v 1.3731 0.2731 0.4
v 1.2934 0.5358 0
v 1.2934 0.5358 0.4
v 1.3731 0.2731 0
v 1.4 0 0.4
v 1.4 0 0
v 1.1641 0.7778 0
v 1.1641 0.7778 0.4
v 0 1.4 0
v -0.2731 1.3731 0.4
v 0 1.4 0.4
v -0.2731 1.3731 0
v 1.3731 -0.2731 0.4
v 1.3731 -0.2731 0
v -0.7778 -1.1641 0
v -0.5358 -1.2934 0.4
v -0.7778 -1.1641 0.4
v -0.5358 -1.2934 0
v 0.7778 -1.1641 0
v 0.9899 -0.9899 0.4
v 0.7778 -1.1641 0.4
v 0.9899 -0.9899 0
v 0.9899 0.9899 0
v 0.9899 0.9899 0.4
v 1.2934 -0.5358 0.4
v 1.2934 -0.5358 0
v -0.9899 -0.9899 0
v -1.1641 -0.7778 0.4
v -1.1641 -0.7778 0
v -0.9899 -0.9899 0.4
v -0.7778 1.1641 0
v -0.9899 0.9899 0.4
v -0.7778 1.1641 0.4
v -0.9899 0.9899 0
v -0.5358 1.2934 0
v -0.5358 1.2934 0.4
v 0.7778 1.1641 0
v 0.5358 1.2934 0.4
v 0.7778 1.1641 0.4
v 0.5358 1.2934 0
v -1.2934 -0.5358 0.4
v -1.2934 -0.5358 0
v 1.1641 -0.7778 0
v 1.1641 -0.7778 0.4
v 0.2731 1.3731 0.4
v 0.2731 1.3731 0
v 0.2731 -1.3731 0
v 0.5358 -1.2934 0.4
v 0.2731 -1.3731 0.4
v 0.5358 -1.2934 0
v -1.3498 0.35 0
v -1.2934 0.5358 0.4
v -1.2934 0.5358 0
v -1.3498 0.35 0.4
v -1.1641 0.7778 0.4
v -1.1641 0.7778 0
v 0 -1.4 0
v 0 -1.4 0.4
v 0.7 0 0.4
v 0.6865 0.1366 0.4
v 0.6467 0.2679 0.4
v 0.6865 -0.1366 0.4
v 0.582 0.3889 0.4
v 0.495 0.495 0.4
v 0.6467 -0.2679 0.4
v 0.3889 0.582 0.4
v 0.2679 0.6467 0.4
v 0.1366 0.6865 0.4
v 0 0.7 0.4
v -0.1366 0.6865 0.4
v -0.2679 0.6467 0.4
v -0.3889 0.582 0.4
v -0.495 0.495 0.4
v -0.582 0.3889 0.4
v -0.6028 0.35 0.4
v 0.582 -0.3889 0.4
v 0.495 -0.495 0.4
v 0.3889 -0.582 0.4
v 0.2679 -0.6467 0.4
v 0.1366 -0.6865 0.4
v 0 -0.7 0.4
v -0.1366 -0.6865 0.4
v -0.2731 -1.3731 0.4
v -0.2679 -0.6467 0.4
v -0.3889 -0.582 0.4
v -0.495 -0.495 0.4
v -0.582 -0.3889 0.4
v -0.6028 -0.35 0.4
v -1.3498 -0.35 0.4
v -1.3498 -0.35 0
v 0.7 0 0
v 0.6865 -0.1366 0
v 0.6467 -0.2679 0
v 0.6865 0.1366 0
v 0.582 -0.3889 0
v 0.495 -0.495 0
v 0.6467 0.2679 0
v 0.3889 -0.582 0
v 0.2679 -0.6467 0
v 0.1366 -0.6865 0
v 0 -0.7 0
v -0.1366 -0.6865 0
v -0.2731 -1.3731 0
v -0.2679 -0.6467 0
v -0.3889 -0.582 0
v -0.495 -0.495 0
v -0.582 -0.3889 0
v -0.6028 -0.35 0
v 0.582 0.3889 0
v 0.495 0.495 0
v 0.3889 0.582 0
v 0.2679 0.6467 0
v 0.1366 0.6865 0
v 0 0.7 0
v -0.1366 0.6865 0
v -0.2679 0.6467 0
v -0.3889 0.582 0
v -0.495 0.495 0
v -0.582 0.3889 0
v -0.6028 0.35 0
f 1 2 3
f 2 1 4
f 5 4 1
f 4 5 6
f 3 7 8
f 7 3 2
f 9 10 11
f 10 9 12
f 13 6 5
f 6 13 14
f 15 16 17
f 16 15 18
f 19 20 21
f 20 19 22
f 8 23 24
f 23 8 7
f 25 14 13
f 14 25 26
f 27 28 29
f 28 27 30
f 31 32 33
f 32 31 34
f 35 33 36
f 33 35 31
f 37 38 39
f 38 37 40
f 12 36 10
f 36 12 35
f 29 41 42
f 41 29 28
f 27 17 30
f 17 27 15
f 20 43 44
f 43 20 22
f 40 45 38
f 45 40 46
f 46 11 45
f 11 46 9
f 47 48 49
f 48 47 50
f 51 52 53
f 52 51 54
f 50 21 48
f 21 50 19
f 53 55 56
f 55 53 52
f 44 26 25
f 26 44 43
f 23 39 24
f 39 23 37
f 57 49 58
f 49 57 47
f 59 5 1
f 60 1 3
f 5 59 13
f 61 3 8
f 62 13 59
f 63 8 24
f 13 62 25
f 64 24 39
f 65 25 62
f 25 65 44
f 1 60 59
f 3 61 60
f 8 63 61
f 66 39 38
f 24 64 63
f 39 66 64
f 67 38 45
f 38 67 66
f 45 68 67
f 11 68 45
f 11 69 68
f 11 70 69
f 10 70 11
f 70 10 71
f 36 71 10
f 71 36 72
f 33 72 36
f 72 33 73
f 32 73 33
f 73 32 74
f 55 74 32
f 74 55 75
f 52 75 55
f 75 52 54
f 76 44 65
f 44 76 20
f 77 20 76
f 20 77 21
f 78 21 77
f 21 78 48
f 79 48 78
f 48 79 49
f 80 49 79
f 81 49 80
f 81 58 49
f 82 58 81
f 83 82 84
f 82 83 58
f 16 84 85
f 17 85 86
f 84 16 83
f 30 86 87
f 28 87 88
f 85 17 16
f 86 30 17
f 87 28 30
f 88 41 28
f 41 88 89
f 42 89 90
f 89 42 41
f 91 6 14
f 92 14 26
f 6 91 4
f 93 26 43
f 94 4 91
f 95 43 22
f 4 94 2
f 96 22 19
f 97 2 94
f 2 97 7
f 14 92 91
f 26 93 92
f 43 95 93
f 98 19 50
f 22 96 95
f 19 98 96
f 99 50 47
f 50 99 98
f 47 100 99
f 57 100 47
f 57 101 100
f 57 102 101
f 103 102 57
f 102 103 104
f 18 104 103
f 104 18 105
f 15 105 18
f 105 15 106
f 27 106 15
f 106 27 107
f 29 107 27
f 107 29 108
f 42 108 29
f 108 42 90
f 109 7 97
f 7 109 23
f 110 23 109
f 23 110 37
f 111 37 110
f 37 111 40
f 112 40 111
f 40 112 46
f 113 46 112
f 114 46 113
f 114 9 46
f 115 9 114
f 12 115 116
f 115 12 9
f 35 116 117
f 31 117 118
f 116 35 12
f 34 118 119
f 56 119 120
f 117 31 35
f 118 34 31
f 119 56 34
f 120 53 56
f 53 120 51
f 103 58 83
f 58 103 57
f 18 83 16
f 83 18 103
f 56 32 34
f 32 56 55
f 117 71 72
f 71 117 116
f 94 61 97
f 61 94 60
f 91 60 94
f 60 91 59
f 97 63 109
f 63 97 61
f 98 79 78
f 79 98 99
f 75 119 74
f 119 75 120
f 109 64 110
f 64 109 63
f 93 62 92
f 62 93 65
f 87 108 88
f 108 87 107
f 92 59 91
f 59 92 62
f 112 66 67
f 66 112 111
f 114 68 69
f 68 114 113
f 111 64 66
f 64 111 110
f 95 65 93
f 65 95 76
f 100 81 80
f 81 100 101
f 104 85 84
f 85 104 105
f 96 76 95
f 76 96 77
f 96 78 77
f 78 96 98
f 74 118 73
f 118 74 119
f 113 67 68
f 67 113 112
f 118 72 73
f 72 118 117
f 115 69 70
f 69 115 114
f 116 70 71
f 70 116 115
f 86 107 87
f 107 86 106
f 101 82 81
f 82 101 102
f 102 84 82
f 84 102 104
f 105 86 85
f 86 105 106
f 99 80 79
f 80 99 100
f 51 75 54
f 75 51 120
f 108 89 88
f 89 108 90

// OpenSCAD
// Parameters
$diameter_inside = 1.4; // Inside diameter in mm
$diameter_outside = 2.8; // Outside diameter in mm
$height = 0.4; // Height of the disk in mm
$hole_diameter = 1.4; // Diameter of the hole
$fn = 32; // Number of fragments for rendering circles and cylinders

// Create the disk
difference() {
    cylinder($height, $diameter_outside / 2, $diameter_outside / 2, $fn, $center = true); // Outside cylinder
    translate([0, 0, -$height]) { // Shift the inside cylinder down by the height
        cylinder($height + 0.1, $diameter_inside / 2, $diameter_inside / 2, $fn, $center = true); // Inside cylinder
    }
    
    // Create the hole in the center
    translate([0, 0, -$height / 2]) {
        cylinder($height + 1, $hole_diameter / 2, $hole_diameter / 2, $fn, $center = true); // Hole cylinder
    }

    // Create the cube to subtract
    difference() {
    translate([-1 , 0, 0]) {
        cube([1.4, 0.7, 1.4], center = true);}
        
    }
}
